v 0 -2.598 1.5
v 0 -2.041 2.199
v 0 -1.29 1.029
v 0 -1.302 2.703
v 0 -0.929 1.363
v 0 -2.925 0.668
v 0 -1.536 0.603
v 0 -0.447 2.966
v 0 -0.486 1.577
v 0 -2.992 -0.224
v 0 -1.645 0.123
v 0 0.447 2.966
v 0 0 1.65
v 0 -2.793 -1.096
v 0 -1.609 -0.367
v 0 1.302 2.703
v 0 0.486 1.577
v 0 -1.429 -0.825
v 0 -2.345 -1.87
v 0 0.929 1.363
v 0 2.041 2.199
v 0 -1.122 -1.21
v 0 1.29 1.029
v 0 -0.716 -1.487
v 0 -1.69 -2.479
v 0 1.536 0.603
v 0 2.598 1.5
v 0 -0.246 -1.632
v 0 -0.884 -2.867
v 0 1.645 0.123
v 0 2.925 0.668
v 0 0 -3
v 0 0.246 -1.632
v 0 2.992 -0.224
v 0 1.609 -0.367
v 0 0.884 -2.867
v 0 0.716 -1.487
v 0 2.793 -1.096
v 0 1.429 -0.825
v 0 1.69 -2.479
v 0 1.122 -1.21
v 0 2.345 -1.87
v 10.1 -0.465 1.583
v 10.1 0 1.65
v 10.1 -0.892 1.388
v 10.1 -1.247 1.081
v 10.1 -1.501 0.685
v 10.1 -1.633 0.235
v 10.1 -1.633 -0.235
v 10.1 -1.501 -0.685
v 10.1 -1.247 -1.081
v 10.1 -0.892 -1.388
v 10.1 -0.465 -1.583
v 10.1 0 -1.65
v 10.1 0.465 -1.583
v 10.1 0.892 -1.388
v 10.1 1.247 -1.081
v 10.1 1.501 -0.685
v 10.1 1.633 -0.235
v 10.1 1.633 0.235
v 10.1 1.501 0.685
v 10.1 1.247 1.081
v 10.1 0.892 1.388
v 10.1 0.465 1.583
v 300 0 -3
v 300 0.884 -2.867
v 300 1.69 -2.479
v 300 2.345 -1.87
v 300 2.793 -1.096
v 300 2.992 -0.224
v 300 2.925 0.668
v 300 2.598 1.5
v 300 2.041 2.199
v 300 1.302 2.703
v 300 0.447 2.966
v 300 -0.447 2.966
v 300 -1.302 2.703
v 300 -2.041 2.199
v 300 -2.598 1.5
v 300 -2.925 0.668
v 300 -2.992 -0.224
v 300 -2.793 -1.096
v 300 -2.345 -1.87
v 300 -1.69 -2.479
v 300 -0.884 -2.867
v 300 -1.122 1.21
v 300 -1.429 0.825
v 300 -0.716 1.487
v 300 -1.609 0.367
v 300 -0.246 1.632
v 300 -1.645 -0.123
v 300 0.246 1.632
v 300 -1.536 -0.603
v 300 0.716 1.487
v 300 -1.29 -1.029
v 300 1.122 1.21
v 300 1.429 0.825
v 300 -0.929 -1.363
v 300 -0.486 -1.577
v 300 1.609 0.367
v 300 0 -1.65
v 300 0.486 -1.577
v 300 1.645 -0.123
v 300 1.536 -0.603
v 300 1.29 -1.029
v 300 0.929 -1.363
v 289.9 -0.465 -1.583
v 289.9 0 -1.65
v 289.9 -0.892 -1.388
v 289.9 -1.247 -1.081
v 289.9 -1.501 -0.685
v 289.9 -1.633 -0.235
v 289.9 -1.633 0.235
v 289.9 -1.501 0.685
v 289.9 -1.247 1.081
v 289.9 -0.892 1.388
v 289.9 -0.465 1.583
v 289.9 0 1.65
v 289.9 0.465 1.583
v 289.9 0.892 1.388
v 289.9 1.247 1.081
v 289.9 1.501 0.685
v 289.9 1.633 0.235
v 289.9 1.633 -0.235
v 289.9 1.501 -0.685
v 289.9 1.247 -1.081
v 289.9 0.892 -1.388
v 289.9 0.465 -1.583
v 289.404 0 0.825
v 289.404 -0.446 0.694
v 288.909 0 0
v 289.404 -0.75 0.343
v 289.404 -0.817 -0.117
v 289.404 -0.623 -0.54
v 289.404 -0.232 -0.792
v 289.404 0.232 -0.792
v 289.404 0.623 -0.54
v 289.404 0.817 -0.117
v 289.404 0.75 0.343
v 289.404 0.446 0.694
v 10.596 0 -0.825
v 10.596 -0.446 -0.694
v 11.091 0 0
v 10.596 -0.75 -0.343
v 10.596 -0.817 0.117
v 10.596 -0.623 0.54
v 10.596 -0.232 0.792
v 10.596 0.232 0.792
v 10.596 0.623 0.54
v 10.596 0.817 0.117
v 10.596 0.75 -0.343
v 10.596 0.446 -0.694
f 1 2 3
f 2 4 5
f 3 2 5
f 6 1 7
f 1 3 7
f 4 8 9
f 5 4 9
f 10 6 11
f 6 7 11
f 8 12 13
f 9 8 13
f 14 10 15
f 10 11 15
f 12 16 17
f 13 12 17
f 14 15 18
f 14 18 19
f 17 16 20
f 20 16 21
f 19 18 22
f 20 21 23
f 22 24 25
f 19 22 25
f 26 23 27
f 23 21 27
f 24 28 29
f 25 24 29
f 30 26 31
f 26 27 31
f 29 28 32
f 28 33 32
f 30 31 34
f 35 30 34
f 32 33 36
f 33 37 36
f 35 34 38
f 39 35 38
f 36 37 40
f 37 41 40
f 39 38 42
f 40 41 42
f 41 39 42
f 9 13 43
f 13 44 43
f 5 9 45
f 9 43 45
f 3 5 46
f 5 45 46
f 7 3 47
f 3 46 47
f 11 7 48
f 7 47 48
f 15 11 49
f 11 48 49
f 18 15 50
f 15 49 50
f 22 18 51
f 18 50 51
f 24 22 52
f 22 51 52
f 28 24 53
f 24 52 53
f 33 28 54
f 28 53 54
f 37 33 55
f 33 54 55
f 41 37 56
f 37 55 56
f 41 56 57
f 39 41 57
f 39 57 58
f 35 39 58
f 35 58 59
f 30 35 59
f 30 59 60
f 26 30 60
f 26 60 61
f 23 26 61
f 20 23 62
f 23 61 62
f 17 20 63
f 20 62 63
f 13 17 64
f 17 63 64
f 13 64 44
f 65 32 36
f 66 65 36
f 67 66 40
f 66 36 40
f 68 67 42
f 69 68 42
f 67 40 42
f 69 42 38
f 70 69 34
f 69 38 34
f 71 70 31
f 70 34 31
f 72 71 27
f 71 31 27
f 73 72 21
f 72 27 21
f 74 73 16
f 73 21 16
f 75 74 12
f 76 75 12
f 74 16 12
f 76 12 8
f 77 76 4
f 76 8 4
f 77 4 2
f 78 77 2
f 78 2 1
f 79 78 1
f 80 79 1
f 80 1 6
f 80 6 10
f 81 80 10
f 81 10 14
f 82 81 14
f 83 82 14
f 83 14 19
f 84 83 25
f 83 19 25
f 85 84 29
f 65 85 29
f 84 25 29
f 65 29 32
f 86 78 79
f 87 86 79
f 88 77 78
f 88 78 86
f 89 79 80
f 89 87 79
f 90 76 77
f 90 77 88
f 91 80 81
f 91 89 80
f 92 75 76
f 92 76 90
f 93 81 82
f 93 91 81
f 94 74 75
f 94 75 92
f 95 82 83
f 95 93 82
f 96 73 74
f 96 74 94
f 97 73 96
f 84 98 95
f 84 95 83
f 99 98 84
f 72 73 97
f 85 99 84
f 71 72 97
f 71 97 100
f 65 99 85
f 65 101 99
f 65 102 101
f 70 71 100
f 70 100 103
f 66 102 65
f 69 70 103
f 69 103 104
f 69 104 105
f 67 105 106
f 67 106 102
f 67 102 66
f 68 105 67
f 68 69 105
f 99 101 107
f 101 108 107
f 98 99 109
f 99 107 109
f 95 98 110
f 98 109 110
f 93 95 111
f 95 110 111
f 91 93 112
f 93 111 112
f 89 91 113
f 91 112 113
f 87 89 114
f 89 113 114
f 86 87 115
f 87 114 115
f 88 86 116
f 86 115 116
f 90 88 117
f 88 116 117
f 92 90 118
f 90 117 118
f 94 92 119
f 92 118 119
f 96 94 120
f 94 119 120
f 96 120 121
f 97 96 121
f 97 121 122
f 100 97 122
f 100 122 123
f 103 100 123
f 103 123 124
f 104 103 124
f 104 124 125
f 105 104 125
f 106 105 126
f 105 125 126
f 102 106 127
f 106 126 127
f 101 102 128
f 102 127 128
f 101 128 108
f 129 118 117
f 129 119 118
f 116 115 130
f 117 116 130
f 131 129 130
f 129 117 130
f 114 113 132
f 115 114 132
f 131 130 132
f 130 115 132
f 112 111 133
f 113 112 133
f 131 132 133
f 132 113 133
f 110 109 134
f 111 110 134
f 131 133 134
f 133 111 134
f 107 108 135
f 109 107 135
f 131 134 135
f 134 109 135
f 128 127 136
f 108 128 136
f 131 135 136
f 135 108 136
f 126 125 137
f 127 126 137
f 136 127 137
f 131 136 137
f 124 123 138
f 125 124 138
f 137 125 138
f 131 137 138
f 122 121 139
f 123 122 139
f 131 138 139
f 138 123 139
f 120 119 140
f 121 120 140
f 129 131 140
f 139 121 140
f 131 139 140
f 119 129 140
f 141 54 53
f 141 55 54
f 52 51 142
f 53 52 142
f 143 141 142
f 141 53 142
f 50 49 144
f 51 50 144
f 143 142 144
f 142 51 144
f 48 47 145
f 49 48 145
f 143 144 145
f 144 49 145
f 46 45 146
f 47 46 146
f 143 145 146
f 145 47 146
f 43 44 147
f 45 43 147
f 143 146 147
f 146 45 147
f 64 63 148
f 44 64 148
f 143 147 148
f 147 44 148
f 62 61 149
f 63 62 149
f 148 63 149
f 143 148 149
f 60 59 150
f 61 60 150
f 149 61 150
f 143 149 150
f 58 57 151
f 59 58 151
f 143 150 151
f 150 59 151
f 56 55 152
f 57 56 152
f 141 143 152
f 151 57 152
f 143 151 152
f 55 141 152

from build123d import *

# Parameters (mm, degrees)
SKETCH1_R                       = 3
BOSS_EXTRUDE1_DEPTH             = 300
M4_TAPPED_HOLE2_D               = 3.3
M4_TAPPED_HOLE2_DEPTH           = 10.1
M4_TAPPED_HOLE2_TIP             = 0.991420021
M4_TAPPED_HOLE2_ON_FACE_2_D     = 3.3
M4_TAPPED_HOLE2_ON_FACE_2_DEPTH = 10.1
M4_TAPPED_HOLE2_ON_FACE_2_TIP   = 0.991420021


with BuildPart() as part:
    # Sketch1 → Boss-Extrude1 (new body)
    with BuildSketch(Plane(origin=(0, 0, 0), x_dir=(0, 0, -1), z_dir=(1, 0, 0))):
        Circle(SKETCH1_R)
    extrude(amount=BOSS_EXTRUDE1_DEPTH)

    # M4 Tapped Hole2
    with Locations(Plane(origin=(0, 0, 0), x_dir=(0, 0, -1), z_dir=(-1, 0, 0))):
        with Locations((0, 0)):
            Hole(M4_TAPPED_HOLE2_D / 2, depth=M4_TAPPED_HOLE2_DEPTH)
            with Locations((0, 0, -(M4_TAPPED_HOLE2_DEPTH + M4_TAPPED_HOLE2_TIP / 2))):  # 118° drill point
                Cone(0, M4_TAPPED_HOLE2_D / 2, M4_TAPPED_HOLE2_TIP, mode=Mode.SUBTRACT)

    # M4 Tapped Hole2 on face 2
    with Locations(Plane(origin=(300, 0, 0), x_dir=(0, 0, 1), z_dir=(1, 0, 0))):
        with Locations((0, 0)):
            Hole(M4_TAPPED_HOLE2_ON_FACE_2_D / 2, depth=M4_TAPPED_HOLE2_ON_FACE_2_DEPTH)
            with Locations((0, 0, -(M4_TAPPED_HOLE2_ON_FACE_2_DEPTH + M4_TAPPED_HOLE2_ON_FACE_2_TIP / 2))):  # 118° drill point
                Cone(0, M4_TAPPED_HOLE2_ON_FACE_2_D / 2, M4_TAPPED_HOLE2_ON_FACE_2_TIP, mode=Mode.SUBTRACT)


solid = part.part
